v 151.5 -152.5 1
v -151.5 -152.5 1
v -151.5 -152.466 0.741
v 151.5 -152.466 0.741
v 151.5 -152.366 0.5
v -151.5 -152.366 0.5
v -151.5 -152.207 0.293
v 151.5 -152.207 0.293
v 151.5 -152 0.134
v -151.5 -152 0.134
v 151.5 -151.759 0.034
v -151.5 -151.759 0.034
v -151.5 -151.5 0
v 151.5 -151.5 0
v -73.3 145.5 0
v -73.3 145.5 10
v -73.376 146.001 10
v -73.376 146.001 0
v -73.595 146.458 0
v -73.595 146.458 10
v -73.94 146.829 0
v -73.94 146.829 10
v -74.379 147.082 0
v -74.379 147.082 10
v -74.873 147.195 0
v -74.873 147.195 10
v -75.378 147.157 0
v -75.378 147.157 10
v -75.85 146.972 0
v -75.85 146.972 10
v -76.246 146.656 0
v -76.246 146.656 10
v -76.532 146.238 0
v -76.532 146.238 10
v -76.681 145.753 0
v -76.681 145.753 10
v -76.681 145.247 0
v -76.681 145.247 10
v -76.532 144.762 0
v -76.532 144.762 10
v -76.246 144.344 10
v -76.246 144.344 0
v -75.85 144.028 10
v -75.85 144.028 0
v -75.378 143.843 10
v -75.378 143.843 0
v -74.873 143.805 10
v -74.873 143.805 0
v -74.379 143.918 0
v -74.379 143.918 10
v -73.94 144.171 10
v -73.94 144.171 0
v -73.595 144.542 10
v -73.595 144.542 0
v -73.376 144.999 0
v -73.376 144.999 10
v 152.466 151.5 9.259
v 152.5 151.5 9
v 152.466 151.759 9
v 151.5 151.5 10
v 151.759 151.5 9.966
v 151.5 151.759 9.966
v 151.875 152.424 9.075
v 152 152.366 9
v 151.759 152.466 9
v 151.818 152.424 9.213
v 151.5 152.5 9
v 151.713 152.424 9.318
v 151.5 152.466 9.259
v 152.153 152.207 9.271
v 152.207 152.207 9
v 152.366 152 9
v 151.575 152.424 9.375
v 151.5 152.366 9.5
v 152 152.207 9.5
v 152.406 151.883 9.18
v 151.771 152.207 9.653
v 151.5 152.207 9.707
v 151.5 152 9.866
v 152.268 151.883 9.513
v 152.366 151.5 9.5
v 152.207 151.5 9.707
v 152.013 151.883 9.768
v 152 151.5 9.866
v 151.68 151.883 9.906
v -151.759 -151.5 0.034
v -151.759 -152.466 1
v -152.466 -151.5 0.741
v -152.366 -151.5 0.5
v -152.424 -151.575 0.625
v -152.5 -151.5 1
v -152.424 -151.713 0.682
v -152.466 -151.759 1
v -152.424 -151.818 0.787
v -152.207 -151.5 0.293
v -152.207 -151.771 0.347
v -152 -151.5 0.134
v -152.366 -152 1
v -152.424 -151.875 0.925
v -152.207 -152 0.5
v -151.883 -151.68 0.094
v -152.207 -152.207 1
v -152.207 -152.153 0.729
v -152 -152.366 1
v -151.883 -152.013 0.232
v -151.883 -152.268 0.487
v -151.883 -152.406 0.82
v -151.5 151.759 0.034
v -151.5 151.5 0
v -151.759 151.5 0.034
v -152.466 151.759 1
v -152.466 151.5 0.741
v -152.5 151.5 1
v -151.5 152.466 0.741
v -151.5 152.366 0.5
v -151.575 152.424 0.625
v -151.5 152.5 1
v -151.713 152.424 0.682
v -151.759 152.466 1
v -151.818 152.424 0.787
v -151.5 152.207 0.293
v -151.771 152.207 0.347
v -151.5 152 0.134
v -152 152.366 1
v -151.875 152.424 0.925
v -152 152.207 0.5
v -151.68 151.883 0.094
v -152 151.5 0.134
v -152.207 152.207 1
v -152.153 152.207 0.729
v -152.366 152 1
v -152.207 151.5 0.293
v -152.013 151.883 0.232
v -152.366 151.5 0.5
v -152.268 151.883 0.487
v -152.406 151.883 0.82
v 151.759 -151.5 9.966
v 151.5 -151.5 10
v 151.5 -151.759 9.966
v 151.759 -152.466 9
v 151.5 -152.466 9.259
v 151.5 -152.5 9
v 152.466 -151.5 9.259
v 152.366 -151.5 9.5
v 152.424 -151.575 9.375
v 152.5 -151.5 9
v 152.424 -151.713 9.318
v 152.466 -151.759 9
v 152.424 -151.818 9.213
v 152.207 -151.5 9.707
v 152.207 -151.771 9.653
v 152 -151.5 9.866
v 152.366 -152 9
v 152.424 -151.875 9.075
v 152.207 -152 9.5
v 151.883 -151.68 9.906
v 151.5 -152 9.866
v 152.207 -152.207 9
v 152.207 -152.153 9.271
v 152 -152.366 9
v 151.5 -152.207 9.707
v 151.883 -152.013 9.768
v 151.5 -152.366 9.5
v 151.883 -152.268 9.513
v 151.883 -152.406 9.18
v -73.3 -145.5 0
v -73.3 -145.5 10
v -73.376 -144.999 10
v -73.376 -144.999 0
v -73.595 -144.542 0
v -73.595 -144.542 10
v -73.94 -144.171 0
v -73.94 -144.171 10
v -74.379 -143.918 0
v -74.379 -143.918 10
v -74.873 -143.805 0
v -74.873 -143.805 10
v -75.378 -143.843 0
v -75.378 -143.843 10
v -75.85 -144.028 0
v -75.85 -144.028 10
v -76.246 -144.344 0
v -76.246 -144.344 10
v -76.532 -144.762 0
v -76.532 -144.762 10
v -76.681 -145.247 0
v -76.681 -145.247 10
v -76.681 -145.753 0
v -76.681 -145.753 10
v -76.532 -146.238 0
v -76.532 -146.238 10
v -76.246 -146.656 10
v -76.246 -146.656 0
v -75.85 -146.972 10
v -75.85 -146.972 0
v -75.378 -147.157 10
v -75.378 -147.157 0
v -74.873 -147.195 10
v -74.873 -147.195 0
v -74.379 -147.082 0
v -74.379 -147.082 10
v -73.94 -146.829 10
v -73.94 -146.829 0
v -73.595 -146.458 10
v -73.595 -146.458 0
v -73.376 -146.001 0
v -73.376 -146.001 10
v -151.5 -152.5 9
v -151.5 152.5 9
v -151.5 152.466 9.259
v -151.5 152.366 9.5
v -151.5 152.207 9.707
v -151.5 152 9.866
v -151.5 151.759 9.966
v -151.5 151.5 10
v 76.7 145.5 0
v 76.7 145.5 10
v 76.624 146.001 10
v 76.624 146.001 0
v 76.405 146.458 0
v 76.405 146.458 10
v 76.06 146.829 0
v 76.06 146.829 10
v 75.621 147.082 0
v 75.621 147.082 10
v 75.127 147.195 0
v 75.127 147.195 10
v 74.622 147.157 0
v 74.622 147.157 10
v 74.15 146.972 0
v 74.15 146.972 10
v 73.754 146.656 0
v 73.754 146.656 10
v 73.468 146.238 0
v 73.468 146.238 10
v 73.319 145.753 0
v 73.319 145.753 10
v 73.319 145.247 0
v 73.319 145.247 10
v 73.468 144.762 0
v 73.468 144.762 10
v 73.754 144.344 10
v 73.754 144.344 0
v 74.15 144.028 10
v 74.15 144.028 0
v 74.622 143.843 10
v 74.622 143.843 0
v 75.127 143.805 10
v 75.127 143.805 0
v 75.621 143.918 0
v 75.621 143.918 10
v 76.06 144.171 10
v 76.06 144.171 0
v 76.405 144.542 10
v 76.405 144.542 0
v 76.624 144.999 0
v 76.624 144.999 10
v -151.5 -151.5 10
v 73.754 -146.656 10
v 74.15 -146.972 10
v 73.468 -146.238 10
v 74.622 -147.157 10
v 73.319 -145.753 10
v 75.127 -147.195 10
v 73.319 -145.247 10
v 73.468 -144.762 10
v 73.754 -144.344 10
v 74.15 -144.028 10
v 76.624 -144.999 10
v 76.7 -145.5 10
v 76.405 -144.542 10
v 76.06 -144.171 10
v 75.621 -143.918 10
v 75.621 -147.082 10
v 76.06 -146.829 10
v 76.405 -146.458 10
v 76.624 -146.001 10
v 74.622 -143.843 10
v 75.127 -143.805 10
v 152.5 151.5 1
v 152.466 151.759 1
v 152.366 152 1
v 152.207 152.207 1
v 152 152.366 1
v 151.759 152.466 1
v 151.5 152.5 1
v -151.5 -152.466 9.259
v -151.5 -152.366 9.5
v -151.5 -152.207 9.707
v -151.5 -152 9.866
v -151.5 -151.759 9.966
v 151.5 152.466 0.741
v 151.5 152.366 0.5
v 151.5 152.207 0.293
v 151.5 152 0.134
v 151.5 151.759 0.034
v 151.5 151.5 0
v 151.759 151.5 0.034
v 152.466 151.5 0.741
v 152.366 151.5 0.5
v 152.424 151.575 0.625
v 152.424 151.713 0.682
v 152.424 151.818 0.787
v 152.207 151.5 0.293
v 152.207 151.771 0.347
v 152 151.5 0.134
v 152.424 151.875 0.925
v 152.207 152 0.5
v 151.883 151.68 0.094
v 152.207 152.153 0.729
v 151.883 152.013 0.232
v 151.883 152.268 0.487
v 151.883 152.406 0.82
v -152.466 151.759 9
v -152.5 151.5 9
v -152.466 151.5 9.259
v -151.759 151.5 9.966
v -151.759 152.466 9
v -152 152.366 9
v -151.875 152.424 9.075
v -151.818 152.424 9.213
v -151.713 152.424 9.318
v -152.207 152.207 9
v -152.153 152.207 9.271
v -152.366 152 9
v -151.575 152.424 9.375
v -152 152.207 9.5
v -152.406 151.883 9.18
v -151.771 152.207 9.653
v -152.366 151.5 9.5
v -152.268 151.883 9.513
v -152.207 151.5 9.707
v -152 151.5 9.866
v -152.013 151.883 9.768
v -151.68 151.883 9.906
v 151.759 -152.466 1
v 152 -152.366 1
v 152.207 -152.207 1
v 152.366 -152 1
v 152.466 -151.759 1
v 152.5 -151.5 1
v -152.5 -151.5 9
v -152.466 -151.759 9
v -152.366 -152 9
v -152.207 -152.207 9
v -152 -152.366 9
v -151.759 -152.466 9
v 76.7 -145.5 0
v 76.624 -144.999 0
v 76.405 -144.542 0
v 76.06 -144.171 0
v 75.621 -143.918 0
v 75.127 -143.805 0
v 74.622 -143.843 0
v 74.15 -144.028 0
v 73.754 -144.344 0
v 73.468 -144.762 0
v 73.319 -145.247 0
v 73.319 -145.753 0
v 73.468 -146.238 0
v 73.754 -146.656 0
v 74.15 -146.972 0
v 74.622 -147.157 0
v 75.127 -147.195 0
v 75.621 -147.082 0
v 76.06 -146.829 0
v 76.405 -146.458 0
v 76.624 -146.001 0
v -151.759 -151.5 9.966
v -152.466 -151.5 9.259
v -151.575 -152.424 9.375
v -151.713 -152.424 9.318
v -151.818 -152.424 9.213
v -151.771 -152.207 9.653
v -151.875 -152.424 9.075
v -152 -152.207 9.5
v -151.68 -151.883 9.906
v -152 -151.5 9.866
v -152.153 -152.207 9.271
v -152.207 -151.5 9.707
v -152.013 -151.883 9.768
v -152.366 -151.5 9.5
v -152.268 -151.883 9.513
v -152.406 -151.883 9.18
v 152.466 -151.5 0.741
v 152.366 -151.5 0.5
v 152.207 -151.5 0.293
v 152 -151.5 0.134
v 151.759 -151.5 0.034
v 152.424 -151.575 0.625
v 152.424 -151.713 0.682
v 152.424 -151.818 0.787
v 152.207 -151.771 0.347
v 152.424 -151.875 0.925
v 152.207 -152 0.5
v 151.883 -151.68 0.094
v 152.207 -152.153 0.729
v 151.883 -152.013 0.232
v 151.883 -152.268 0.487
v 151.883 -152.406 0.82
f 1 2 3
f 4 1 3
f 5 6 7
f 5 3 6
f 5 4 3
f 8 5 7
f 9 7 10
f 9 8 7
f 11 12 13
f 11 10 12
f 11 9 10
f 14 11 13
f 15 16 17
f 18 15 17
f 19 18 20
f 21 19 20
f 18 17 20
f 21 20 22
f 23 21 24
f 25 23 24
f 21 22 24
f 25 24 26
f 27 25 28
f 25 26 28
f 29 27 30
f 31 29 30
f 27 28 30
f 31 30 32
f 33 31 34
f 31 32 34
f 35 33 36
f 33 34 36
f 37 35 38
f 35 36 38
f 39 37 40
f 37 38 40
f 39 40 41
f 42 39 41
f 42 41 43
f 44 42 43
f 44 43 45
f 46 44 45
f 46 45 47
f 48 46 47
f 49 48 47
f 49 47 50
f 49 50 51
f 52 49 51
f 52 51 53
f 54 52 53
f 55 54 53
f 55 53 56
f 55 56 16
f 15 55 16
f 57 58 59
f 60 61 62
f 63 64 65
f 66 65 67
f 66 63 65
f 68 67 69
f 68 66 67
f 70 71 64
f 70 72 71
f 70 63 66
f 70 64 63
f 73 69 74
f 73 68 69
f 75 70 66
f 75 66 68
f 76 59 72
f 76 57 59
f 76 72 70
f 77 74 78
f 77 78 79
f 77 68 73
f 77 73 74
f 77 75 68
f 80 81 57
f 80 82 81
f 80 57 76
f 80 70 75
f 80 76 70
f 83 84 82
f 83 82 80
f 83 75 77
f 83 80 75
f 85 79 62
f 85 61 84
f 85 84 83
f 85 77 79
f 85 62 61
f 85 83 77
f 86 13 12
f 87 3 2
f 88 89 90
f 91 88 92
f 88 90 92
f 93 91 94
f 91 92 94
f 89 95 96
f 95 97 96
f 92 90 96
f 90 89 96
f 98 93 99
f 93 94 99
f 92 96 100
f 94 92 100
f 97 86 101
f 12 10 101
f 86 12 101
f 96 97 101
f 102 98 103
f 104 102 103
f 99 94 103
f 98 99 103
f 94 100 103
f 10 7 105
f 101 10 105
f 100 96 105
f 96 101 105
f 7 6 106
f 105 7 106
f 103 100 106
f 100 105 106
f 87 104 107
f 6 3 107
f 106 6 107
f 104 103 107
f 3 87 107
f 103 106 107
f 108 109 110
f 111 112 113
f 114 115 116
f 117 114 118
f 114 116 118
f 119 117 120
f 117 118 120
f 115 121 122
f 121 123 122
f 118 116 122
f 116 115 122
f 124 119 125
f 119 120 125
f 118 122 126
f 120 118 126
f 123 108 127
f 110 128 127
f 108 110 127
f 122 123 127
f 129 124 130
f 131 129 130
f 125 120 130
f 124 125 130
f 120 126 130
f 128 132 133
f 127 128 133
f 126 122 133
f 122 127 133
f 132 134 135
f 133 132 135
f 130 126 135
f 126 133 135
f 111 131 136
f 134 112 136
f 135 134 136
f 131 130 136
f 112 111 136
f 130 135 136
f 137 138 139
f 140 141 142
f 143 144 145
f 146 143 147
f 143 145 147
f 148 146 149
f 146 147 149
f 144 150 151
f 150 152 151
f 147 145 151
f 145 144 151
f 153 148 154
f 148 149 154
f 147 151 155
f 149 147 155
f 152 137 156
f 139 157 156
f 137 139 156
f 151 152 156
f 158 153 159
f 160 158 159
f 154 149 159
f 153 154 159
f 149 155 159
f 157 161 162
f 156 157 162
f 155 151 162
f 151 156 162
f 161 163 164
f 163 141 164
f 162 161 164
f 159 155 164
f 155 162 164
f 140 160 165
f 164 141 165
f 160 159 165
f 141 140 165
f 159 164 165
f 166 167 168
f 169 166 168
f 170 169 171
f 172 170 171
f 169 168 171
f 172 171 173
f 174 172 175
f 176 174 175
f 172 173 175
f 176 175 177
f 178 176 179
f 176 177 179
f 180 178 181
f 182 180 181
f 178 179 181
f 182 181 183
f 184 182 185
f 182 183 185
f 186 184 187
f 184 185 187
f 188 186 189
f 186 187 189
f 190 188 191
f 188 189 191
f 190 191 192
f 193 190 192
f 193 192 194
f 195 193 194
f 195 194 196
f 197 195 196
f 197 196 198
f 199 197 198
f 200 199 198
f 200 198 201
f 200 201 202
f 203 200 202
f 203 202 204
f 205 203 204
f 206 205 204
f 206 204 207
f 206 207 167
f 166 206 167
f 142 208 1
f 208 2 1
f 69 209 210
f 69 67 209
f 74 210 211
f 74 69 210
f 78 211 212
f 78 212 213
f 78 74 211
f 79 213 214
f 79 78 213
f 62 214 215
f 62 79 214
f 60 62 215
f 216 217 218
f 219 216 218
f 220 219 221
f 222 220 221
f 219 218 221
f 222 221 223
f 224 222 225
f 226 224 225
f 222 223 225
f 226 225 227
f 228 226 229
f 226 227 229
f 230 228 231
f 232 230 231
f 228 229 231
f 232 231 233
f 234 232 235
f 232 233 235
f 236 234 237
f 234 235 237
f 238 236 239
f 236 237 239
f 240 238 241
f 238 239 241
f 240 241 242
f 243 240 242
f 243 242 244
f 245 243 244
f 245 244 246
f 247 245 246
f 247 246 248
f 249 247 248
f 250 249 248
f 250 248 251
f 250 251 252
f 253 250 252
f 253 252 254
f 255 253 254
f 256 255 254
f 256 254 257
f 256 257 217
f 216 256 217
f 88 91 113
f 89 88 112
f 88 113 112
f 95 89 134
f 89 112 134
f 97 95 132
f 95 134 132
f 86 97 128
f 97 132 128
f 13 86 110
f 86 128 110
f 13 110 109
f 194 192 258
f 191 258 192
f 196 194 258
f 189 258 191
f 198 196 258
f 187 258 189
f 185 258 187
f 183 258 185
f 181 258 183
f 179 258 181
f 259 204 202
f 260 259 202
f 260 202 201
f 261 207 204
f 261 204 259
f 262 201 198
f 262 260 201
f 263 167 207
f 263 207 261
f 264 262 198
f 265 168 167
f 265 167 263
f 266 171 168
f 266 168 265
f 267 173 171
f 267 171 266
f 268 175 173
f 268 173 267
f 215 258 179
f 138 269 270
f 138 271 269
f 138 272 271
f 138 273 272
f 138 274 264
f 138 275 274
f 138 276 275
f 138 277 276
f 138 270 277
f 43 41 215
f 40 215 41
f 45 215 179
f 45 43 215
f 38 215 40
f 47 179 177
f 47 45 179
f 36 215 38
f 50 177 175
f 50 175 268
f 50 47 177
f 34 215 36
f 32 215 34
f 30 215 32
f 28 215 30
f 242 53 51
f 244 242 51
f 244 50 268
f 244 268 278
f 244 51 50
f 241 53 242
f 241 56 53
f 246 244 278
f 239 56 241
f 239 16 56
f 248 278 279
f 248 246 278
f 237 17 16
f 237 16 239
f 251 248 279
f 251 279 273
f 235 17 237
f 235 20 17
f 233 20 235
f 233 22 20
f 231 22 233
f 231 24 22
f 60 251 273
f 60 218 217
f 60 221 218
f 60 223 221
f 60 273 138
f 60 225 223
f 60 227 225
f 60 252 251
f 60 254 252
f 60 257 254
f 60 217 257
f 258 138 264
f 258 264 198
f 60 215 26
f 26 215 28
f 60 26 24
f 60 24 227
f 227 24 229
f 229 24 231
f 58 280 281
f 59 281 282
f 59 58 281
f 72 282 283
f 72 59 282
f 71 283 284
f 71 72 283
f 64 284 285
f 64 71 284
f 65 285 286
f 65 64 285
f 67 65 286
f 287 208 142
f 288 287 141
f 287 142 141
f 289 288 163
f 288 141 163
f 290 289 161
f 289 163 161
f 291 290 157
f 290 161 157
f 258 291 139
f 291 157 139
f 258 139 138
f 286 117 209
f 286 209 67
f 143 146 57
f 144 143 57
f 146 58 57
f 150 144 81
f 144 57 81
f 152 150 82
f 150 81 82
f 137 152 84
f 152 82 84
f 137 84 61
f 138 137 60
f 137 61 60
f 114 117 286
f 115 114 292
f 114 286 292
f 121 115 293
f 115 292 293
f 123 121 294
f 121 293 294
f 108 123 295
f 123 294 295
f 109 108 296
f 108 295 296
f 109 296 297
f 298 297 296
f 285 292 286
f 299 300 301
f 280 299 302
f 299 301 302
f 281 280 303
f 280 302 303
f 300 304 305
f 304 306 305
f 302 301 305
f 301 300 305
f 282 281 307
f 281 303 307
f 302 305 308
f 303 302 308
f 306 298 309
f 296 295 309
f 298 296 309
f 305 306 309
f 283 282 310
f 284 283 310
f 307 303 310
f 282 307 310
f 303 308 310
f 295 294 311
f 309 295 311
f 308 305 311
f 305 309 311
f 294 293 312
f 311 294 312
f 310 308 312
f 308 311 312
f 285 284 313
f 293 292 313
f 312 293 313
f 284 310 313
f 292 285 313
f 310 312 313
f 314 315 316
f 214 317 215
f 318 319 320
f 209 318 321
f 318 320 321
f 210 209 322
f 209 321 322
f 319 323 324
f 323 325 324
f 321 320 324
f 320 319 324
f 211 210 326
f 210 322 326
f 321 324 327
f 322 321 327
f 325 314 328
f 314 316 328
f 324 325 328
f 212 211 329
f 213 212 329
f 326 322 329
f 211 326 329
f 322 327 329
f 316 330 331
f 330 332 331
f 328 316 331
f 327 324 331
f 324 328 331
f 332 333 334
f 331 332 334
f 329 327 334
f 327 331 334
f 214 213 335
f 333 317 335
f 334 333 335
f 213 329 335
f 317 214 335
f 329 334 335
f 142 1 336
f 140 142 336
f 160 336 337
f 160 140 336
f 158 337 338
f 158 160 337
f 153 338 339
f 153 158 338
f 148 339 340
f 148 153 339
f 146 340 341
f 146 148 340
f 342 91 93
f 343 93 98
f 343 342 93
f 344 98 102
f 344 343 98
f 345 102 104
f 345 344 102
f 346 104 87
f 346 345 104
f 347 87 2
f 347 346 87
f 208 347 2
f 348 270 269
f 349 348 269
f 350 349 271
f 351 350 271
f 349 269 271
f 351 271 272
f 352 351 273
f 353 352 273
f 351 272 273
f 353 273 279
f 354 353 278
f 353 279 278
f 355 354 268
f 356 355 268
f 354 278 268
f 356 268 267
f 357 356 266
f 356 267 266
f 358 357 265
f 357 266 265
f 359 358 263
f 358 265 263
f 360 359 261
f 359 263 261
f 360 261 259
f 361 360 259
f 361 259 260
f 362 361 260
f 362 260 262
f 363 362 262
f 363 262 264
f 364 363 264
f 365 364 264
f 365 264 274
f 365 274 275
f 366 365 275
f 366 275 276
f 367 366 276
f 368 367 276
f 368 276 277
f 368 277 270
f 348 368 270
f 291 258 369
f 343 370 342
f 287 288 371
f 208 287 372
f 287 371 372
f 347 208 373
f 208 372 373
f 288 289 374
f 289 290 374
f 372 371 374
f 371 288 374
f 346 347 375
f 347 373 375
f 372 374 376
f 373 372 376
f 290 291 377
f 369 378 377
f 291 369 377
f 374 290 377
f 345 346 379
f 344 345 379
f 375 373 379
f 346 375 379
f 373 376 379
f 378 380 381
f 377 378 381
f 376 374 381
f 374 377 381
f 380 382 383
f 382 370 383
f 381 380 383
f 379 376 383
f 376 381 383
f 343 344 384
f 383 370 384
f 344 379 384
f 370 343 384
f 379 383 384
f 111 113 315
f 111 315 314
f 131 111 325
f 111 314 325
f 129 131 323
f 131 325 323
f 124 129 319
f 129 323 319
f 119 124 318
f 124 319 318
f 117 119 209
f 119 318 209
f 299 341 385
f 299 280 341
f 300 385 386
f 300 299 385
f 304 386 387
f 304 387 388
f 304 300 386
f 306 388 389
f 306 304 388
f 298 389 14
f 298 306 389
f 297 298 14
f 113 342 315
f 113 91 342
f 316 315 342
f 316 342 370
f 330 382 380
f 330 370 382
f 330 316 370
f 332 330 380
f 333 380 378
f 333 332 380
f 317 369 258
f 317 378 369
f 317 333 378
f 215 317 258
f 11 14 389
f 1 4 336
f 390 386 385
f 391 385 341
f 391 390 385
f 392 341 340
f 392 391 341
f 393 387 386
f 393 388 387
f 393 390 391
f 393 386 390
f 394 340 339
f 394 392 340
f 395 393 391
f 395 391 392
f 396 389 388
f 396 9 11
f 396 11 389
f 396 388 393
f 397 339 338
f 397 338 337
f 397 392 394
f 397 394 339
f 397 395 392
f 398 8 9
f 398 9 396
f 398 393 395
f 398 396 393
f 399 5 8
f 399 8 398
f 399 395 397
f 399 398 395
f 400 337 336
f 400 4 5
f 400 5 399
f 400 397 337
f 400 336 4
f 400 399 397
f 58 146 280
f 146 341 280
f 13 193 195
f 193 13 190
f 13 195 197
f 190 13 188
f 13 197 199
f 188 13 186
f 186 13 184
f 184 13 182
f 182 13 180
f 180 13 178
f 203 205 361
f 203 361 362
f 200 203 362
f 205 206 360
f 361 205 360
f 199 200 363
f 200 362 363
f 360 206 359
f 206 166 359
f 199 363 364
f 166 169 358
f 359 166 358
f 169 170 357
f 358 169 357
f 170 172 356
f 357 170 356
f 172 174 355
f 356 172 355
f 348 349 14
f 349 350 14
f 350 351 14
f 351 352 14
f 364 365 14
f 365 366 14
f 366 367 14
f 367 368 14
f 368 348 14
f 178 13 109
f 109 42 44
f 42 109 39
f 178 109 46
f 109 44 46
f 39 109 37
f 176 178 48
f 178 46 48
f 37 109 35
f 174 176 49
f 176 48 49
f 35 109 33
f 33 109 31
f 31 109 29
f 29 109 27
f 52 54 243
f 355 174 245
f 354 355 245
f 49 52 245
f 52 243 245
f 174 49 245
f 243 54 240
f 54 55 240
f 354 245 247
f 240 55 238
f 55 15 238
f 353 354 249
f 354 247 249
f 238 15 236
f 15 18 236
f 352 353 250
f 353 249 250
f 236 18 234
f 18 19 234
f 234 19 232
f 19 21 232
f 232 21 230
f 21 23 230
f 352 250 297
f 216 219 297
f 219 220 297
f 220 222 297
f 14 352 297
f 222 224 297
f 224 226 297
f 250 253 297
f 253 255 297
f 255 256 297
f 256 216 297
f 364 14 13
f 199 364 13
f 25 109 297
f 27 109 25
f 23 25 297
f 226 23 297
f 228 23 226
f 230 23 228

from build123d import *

# Parameters (mm, degrees)
SKETCH1_W            = 305
SKETCH1_H            = 305
CAST_ALUMINIUM_DEPTH = 10
CORNER_FILLETS_R     = 1
SKETCH2_R            = 1.7
MOUNTING_HOLES_DEPTH = 216.899282074


with BuildPart() as part:
    # Sketch1 → cast aluminium (new body)
    with BuildSketch(Plane.XY):
        Rectangle(SKETCH1_W, SKETCH1_H)
    extrude(amount=CAST_ALUMINIUM_DEPTH)

    # corner fillets
    corner_fillets_edges = [part.edges().sort_by_distance(p)[0] for p in [
        (-152.5, 0, 10),
        (0, -152.5, 10),
        (152.5, 0, 10),
        (0, -152.5, 0),
        (-152.5, 0, 0),
        (0, 152.5, 0),
        (152.5, 0, 0),
        (152.5, -152.5, 5),
        (-152.5, -152.5, 5),
        (-152.5, 152.5, 5),
        (152.5, 152.5, 5),
        (0, 152.5, 10),
    ]]
    fillet(corner_fillets_edges, radius=CORNER_FILLETS_R)

    # Sketch2 → mounting holes (cut, through all)
    with BuildSketch(Plane.XY.offset(10)):
        with Locations((-75, 145.5)):
            Circle(SKETCH2_R)
        with Locations((75, 145.5)):
            Circle(SKETCH2_R)
        with Locations((75, -145.5)):
            Circle(SKETCH2_R)
        with Locations((-75, -145.5)):
            Circle(SKETCH2_R)
    extrude(amount=-MOUNTING_HOLES_DEPTH, mode=Mode.SUBTRACT)


solid = part.part
